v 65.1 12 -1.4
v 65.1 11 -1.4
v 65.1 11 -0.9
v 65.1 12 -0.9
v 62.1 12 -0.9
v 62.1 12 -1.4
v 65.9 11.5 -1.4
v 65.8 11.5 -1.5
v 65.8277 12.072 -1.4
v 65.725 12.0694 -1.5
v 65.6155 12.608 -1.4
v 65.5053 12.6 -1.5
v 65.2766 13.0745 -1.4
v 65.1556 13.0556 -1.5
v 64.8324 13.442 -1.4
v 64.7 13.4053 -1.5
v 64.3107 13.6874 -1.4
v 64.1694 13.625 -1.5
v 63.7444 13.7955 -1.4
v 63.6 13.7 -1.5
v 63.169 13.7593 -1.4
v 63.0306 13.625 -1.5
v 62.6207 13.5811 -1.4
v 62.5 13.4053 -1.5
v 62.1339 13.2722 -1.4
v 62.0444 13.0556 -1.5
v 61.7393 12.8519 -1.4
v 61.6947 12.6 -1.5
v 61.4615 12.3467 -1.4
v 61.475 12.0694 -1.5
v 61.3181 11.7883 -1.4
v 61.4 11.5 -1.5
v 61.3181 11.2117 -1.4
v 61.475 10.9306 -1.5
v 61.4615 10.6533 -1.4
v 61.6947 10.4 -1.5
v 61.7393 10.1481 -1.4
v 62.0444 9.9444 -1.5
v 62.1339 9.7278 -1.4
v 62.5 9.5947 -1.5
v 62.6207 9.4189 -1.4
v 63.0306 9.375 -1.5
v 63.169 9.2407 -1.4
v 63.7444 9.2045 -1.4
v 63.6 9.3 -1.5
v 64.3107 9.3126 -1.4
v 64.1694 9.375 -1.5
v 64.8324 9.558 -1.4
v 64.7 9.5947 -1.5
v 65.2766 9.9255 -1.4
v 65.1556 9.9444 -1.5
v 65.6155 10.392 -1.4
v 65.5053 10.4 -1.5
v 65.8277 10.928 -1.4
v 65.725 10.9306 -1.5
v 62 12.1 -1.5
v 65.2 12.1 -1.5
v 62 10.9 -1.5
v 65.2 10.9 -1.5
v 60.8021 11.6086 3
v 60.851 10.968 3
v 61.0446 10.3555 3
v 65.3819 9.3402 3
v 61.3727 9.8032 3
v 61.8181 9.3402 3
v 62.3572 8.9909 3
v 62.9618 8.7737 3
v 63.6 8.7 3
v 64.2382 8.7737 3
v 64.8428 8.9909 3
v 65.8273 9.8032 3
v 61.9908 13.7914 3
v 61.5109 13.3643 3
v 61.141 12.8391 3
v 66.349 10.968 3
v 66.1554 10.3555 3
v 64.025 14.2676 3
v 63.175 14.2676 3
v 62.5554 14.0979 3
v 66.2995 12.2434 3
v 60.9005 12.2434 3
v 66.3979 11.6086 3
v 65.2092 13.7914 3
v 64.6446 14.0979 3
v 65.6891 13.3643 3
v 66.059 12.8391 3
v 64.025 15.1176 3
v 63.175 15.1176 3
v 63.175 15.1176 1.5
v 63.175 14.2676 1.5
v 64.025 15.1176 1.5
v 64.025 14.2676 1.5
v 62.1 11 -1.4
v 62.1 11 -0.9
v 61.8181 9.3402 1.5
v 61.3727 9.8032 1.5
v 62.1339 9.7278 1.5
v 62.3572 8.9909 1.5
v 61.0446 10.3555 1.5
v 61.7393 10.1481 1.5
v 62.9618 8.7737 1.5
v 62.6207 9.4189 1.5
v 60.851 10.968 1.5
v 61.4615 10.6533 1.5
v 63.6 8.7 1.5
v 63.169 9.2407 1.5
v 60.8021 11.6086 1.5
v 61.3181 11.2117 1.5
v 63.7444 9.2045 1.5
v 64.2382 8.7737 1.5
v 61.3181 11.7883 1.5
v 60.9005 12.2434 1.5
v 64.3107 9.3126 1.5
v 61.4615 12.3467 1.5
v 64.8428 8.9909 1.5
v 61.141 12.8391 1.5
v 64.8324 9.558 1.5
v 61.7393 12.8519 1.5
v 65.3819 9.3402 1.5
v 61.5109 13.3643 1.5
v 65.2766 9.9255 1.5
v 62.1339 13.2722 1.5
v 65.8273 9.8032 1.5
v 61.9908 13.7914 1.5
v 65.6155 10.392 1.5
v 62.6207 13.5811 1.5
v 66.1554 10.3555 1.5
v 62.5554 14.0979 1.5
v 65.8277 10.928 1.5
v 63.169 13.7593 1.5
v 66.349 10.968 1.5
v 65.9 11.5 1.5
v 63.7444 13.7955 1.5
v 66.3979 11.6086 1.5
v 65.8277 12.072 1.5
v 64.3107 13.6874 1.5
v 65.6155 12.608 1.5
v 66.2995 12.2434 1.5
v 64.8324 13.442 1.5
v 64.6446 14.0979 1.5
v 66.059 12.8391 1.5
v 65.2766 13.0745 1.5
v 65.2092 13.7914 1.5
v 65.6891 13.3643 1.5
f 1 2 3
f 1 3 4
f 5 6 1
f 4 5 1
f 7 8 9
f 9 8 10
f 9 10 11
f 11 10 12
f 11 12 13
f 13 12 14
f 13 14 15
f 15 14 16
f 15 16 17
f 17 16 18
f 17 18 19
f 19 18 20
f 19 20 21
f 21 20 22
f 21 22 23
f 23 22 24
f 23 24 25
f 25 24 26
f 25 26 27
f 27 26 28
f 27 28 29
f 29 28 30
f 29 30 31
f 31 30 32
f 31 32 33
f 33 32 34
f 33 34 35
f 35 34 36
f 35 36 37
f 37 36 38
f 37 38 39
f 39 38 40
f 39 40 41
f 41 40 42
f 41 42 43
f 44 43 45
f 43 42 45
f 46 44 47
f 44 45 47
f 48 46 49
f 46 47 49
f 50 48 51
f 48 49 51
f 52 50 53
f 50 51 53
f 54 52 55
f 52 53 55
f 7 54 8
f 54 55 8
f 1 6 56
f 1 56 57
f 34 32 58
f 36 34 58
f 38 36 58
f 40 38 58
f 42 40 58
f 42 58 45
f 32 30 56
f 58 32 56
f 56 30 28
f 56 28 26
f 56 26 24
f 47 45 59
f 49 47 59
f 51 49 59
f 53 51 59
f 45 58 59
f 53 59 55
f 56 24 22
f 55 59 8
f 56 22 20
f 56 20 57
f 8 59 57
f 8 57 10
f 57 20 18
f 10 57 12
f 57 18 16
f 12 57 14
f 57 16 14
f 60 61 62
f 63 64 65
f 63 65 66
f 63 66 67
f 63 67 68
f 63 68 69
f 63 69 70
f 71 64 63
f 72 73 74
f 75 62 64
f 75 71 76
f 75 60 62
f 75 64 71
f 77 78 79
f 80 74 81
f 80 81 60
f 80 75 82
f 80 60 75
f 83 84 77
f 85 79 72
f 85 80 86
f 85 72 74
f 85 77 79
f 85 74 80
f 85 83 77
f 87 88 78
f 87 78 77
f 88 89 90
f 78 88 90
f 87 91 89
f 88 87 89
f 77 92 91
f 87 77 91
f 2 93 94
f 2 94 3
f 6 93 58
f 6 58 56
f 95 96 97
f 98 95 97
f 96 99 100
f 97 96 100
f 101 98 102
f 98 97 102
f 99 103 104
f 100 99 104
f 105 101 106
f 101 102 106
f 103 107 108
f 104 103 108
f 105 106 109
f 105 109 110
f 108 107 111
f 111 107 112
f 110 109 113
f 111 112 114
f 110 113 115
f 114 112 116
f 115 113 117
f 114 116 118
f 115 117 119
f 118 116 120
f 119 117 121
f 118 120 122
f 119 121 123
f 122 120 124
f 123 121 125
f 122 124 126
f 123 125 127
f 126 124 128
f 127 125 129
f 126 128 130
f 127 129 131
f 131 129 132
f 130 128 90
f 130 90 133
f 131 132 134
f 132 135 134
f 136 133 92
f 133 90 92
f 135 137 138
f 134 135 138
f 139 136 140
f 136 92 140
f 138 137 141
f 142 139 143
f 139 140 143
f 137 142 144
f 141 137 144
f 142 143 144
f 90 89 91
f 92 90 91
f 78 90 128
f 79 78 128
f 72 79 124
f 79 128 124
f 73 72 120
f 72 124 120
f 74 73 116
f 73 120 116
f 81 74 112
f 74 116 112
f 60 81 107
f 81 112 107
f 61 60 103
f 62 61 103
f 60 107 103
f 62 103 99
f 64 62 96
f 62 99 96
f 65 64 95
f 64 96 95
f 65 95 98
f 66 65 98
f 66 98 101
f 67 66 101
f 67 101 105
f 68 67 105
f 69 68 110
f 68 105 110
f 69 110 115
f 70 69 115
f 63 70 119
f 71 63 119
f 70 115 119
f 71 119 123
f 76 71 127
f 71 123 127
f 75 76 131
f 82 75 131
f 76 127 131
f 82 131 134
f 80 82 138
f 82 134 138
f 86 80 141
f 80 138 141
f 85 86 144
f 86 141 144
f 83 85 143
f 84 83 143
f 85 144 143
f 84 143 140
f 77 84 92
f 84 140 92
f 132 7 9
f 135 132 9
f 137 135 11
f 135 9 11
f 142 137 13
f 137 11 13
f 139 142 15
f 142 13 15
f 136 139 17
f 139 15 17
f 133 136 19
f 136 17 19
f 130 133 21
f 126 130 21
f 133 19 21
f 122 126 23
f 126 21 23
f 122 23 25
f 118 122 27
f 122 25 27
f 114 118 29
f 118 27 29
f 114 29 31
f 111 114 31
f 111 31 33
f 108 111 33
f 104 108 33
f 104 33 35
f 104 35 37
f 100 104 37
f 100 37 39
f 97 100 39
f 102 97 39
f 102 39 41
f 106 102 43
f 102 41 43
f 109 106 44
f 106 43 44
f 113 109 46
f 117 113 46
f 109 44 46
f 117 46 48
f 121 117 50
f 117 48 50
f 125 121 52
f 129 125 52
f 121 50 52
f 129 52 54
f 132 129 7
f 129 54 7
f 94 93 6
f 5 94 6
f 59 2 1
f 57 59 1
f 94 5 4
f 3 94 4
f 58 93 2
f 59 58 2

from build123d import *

# Parameters (mm, degrees)
SKETCH064_R     = 2.3
PAD044_DEPTH    = 3
PAD045_DEPTH    = 1.5
SKETCH066_W     = 3
SKETCH066_H     = 1
POCKET013_DEPTH = 0.6
CHAMFER007_SIZE = 0.1


with BuildPart() as part:
    # Sketch064 → Pad044 (new body)
    with BuildSketch(Plane.XY):
        Circle(SKETCH064_R)
    extrude(amount=PAD044_DEPTH)

    # Sketch065 (on Face3 of Pad044) → Pad045 (join)
    with BuildSketch(Plane.XY.offset(3)):
        with BuildLine():
            Line((0.425, 2.767558), (0.425, 3.617558))
            Line((0.425, 3.617558), (-0.425, 3.617558))
            Line((-0.425, 3.617558), (-0.425, 2.767558))
            ThreePointArc((-0.425, 2.767558), (0, -2.8), (0.425, 2.767558))
        make_face()
    extrude(amount=PAD045_DEPTH)

    # Sketch066 → Pocket013 (cut)
    with BuildSketch(Plane.XY):
        Rectangle(SKETCH066_W, SKETCH066_H)
    extrude(amount=POCKET013_DEPTH, mode=Mode.SUBTRACT)

    # Chamfer007
    chamfer007_edges = [part.edges().sort_by_distance(p)[0] for p in [
        (0, -0.5, 0),
        (-2.3, 0, 0),
        (-1.5, 0, 0),
        (0, 0.5, 0),
        (1.5, 0, 0),
    ]]
    chamfer(chamfer007_edges, length=CHAMFER007_SIZE)


with BuildPart() as part_1:
    # Body019 placement: moved
    add(part.part.moved(Location((63.6, 11.5, -1.5))))


solid = part_1.part
